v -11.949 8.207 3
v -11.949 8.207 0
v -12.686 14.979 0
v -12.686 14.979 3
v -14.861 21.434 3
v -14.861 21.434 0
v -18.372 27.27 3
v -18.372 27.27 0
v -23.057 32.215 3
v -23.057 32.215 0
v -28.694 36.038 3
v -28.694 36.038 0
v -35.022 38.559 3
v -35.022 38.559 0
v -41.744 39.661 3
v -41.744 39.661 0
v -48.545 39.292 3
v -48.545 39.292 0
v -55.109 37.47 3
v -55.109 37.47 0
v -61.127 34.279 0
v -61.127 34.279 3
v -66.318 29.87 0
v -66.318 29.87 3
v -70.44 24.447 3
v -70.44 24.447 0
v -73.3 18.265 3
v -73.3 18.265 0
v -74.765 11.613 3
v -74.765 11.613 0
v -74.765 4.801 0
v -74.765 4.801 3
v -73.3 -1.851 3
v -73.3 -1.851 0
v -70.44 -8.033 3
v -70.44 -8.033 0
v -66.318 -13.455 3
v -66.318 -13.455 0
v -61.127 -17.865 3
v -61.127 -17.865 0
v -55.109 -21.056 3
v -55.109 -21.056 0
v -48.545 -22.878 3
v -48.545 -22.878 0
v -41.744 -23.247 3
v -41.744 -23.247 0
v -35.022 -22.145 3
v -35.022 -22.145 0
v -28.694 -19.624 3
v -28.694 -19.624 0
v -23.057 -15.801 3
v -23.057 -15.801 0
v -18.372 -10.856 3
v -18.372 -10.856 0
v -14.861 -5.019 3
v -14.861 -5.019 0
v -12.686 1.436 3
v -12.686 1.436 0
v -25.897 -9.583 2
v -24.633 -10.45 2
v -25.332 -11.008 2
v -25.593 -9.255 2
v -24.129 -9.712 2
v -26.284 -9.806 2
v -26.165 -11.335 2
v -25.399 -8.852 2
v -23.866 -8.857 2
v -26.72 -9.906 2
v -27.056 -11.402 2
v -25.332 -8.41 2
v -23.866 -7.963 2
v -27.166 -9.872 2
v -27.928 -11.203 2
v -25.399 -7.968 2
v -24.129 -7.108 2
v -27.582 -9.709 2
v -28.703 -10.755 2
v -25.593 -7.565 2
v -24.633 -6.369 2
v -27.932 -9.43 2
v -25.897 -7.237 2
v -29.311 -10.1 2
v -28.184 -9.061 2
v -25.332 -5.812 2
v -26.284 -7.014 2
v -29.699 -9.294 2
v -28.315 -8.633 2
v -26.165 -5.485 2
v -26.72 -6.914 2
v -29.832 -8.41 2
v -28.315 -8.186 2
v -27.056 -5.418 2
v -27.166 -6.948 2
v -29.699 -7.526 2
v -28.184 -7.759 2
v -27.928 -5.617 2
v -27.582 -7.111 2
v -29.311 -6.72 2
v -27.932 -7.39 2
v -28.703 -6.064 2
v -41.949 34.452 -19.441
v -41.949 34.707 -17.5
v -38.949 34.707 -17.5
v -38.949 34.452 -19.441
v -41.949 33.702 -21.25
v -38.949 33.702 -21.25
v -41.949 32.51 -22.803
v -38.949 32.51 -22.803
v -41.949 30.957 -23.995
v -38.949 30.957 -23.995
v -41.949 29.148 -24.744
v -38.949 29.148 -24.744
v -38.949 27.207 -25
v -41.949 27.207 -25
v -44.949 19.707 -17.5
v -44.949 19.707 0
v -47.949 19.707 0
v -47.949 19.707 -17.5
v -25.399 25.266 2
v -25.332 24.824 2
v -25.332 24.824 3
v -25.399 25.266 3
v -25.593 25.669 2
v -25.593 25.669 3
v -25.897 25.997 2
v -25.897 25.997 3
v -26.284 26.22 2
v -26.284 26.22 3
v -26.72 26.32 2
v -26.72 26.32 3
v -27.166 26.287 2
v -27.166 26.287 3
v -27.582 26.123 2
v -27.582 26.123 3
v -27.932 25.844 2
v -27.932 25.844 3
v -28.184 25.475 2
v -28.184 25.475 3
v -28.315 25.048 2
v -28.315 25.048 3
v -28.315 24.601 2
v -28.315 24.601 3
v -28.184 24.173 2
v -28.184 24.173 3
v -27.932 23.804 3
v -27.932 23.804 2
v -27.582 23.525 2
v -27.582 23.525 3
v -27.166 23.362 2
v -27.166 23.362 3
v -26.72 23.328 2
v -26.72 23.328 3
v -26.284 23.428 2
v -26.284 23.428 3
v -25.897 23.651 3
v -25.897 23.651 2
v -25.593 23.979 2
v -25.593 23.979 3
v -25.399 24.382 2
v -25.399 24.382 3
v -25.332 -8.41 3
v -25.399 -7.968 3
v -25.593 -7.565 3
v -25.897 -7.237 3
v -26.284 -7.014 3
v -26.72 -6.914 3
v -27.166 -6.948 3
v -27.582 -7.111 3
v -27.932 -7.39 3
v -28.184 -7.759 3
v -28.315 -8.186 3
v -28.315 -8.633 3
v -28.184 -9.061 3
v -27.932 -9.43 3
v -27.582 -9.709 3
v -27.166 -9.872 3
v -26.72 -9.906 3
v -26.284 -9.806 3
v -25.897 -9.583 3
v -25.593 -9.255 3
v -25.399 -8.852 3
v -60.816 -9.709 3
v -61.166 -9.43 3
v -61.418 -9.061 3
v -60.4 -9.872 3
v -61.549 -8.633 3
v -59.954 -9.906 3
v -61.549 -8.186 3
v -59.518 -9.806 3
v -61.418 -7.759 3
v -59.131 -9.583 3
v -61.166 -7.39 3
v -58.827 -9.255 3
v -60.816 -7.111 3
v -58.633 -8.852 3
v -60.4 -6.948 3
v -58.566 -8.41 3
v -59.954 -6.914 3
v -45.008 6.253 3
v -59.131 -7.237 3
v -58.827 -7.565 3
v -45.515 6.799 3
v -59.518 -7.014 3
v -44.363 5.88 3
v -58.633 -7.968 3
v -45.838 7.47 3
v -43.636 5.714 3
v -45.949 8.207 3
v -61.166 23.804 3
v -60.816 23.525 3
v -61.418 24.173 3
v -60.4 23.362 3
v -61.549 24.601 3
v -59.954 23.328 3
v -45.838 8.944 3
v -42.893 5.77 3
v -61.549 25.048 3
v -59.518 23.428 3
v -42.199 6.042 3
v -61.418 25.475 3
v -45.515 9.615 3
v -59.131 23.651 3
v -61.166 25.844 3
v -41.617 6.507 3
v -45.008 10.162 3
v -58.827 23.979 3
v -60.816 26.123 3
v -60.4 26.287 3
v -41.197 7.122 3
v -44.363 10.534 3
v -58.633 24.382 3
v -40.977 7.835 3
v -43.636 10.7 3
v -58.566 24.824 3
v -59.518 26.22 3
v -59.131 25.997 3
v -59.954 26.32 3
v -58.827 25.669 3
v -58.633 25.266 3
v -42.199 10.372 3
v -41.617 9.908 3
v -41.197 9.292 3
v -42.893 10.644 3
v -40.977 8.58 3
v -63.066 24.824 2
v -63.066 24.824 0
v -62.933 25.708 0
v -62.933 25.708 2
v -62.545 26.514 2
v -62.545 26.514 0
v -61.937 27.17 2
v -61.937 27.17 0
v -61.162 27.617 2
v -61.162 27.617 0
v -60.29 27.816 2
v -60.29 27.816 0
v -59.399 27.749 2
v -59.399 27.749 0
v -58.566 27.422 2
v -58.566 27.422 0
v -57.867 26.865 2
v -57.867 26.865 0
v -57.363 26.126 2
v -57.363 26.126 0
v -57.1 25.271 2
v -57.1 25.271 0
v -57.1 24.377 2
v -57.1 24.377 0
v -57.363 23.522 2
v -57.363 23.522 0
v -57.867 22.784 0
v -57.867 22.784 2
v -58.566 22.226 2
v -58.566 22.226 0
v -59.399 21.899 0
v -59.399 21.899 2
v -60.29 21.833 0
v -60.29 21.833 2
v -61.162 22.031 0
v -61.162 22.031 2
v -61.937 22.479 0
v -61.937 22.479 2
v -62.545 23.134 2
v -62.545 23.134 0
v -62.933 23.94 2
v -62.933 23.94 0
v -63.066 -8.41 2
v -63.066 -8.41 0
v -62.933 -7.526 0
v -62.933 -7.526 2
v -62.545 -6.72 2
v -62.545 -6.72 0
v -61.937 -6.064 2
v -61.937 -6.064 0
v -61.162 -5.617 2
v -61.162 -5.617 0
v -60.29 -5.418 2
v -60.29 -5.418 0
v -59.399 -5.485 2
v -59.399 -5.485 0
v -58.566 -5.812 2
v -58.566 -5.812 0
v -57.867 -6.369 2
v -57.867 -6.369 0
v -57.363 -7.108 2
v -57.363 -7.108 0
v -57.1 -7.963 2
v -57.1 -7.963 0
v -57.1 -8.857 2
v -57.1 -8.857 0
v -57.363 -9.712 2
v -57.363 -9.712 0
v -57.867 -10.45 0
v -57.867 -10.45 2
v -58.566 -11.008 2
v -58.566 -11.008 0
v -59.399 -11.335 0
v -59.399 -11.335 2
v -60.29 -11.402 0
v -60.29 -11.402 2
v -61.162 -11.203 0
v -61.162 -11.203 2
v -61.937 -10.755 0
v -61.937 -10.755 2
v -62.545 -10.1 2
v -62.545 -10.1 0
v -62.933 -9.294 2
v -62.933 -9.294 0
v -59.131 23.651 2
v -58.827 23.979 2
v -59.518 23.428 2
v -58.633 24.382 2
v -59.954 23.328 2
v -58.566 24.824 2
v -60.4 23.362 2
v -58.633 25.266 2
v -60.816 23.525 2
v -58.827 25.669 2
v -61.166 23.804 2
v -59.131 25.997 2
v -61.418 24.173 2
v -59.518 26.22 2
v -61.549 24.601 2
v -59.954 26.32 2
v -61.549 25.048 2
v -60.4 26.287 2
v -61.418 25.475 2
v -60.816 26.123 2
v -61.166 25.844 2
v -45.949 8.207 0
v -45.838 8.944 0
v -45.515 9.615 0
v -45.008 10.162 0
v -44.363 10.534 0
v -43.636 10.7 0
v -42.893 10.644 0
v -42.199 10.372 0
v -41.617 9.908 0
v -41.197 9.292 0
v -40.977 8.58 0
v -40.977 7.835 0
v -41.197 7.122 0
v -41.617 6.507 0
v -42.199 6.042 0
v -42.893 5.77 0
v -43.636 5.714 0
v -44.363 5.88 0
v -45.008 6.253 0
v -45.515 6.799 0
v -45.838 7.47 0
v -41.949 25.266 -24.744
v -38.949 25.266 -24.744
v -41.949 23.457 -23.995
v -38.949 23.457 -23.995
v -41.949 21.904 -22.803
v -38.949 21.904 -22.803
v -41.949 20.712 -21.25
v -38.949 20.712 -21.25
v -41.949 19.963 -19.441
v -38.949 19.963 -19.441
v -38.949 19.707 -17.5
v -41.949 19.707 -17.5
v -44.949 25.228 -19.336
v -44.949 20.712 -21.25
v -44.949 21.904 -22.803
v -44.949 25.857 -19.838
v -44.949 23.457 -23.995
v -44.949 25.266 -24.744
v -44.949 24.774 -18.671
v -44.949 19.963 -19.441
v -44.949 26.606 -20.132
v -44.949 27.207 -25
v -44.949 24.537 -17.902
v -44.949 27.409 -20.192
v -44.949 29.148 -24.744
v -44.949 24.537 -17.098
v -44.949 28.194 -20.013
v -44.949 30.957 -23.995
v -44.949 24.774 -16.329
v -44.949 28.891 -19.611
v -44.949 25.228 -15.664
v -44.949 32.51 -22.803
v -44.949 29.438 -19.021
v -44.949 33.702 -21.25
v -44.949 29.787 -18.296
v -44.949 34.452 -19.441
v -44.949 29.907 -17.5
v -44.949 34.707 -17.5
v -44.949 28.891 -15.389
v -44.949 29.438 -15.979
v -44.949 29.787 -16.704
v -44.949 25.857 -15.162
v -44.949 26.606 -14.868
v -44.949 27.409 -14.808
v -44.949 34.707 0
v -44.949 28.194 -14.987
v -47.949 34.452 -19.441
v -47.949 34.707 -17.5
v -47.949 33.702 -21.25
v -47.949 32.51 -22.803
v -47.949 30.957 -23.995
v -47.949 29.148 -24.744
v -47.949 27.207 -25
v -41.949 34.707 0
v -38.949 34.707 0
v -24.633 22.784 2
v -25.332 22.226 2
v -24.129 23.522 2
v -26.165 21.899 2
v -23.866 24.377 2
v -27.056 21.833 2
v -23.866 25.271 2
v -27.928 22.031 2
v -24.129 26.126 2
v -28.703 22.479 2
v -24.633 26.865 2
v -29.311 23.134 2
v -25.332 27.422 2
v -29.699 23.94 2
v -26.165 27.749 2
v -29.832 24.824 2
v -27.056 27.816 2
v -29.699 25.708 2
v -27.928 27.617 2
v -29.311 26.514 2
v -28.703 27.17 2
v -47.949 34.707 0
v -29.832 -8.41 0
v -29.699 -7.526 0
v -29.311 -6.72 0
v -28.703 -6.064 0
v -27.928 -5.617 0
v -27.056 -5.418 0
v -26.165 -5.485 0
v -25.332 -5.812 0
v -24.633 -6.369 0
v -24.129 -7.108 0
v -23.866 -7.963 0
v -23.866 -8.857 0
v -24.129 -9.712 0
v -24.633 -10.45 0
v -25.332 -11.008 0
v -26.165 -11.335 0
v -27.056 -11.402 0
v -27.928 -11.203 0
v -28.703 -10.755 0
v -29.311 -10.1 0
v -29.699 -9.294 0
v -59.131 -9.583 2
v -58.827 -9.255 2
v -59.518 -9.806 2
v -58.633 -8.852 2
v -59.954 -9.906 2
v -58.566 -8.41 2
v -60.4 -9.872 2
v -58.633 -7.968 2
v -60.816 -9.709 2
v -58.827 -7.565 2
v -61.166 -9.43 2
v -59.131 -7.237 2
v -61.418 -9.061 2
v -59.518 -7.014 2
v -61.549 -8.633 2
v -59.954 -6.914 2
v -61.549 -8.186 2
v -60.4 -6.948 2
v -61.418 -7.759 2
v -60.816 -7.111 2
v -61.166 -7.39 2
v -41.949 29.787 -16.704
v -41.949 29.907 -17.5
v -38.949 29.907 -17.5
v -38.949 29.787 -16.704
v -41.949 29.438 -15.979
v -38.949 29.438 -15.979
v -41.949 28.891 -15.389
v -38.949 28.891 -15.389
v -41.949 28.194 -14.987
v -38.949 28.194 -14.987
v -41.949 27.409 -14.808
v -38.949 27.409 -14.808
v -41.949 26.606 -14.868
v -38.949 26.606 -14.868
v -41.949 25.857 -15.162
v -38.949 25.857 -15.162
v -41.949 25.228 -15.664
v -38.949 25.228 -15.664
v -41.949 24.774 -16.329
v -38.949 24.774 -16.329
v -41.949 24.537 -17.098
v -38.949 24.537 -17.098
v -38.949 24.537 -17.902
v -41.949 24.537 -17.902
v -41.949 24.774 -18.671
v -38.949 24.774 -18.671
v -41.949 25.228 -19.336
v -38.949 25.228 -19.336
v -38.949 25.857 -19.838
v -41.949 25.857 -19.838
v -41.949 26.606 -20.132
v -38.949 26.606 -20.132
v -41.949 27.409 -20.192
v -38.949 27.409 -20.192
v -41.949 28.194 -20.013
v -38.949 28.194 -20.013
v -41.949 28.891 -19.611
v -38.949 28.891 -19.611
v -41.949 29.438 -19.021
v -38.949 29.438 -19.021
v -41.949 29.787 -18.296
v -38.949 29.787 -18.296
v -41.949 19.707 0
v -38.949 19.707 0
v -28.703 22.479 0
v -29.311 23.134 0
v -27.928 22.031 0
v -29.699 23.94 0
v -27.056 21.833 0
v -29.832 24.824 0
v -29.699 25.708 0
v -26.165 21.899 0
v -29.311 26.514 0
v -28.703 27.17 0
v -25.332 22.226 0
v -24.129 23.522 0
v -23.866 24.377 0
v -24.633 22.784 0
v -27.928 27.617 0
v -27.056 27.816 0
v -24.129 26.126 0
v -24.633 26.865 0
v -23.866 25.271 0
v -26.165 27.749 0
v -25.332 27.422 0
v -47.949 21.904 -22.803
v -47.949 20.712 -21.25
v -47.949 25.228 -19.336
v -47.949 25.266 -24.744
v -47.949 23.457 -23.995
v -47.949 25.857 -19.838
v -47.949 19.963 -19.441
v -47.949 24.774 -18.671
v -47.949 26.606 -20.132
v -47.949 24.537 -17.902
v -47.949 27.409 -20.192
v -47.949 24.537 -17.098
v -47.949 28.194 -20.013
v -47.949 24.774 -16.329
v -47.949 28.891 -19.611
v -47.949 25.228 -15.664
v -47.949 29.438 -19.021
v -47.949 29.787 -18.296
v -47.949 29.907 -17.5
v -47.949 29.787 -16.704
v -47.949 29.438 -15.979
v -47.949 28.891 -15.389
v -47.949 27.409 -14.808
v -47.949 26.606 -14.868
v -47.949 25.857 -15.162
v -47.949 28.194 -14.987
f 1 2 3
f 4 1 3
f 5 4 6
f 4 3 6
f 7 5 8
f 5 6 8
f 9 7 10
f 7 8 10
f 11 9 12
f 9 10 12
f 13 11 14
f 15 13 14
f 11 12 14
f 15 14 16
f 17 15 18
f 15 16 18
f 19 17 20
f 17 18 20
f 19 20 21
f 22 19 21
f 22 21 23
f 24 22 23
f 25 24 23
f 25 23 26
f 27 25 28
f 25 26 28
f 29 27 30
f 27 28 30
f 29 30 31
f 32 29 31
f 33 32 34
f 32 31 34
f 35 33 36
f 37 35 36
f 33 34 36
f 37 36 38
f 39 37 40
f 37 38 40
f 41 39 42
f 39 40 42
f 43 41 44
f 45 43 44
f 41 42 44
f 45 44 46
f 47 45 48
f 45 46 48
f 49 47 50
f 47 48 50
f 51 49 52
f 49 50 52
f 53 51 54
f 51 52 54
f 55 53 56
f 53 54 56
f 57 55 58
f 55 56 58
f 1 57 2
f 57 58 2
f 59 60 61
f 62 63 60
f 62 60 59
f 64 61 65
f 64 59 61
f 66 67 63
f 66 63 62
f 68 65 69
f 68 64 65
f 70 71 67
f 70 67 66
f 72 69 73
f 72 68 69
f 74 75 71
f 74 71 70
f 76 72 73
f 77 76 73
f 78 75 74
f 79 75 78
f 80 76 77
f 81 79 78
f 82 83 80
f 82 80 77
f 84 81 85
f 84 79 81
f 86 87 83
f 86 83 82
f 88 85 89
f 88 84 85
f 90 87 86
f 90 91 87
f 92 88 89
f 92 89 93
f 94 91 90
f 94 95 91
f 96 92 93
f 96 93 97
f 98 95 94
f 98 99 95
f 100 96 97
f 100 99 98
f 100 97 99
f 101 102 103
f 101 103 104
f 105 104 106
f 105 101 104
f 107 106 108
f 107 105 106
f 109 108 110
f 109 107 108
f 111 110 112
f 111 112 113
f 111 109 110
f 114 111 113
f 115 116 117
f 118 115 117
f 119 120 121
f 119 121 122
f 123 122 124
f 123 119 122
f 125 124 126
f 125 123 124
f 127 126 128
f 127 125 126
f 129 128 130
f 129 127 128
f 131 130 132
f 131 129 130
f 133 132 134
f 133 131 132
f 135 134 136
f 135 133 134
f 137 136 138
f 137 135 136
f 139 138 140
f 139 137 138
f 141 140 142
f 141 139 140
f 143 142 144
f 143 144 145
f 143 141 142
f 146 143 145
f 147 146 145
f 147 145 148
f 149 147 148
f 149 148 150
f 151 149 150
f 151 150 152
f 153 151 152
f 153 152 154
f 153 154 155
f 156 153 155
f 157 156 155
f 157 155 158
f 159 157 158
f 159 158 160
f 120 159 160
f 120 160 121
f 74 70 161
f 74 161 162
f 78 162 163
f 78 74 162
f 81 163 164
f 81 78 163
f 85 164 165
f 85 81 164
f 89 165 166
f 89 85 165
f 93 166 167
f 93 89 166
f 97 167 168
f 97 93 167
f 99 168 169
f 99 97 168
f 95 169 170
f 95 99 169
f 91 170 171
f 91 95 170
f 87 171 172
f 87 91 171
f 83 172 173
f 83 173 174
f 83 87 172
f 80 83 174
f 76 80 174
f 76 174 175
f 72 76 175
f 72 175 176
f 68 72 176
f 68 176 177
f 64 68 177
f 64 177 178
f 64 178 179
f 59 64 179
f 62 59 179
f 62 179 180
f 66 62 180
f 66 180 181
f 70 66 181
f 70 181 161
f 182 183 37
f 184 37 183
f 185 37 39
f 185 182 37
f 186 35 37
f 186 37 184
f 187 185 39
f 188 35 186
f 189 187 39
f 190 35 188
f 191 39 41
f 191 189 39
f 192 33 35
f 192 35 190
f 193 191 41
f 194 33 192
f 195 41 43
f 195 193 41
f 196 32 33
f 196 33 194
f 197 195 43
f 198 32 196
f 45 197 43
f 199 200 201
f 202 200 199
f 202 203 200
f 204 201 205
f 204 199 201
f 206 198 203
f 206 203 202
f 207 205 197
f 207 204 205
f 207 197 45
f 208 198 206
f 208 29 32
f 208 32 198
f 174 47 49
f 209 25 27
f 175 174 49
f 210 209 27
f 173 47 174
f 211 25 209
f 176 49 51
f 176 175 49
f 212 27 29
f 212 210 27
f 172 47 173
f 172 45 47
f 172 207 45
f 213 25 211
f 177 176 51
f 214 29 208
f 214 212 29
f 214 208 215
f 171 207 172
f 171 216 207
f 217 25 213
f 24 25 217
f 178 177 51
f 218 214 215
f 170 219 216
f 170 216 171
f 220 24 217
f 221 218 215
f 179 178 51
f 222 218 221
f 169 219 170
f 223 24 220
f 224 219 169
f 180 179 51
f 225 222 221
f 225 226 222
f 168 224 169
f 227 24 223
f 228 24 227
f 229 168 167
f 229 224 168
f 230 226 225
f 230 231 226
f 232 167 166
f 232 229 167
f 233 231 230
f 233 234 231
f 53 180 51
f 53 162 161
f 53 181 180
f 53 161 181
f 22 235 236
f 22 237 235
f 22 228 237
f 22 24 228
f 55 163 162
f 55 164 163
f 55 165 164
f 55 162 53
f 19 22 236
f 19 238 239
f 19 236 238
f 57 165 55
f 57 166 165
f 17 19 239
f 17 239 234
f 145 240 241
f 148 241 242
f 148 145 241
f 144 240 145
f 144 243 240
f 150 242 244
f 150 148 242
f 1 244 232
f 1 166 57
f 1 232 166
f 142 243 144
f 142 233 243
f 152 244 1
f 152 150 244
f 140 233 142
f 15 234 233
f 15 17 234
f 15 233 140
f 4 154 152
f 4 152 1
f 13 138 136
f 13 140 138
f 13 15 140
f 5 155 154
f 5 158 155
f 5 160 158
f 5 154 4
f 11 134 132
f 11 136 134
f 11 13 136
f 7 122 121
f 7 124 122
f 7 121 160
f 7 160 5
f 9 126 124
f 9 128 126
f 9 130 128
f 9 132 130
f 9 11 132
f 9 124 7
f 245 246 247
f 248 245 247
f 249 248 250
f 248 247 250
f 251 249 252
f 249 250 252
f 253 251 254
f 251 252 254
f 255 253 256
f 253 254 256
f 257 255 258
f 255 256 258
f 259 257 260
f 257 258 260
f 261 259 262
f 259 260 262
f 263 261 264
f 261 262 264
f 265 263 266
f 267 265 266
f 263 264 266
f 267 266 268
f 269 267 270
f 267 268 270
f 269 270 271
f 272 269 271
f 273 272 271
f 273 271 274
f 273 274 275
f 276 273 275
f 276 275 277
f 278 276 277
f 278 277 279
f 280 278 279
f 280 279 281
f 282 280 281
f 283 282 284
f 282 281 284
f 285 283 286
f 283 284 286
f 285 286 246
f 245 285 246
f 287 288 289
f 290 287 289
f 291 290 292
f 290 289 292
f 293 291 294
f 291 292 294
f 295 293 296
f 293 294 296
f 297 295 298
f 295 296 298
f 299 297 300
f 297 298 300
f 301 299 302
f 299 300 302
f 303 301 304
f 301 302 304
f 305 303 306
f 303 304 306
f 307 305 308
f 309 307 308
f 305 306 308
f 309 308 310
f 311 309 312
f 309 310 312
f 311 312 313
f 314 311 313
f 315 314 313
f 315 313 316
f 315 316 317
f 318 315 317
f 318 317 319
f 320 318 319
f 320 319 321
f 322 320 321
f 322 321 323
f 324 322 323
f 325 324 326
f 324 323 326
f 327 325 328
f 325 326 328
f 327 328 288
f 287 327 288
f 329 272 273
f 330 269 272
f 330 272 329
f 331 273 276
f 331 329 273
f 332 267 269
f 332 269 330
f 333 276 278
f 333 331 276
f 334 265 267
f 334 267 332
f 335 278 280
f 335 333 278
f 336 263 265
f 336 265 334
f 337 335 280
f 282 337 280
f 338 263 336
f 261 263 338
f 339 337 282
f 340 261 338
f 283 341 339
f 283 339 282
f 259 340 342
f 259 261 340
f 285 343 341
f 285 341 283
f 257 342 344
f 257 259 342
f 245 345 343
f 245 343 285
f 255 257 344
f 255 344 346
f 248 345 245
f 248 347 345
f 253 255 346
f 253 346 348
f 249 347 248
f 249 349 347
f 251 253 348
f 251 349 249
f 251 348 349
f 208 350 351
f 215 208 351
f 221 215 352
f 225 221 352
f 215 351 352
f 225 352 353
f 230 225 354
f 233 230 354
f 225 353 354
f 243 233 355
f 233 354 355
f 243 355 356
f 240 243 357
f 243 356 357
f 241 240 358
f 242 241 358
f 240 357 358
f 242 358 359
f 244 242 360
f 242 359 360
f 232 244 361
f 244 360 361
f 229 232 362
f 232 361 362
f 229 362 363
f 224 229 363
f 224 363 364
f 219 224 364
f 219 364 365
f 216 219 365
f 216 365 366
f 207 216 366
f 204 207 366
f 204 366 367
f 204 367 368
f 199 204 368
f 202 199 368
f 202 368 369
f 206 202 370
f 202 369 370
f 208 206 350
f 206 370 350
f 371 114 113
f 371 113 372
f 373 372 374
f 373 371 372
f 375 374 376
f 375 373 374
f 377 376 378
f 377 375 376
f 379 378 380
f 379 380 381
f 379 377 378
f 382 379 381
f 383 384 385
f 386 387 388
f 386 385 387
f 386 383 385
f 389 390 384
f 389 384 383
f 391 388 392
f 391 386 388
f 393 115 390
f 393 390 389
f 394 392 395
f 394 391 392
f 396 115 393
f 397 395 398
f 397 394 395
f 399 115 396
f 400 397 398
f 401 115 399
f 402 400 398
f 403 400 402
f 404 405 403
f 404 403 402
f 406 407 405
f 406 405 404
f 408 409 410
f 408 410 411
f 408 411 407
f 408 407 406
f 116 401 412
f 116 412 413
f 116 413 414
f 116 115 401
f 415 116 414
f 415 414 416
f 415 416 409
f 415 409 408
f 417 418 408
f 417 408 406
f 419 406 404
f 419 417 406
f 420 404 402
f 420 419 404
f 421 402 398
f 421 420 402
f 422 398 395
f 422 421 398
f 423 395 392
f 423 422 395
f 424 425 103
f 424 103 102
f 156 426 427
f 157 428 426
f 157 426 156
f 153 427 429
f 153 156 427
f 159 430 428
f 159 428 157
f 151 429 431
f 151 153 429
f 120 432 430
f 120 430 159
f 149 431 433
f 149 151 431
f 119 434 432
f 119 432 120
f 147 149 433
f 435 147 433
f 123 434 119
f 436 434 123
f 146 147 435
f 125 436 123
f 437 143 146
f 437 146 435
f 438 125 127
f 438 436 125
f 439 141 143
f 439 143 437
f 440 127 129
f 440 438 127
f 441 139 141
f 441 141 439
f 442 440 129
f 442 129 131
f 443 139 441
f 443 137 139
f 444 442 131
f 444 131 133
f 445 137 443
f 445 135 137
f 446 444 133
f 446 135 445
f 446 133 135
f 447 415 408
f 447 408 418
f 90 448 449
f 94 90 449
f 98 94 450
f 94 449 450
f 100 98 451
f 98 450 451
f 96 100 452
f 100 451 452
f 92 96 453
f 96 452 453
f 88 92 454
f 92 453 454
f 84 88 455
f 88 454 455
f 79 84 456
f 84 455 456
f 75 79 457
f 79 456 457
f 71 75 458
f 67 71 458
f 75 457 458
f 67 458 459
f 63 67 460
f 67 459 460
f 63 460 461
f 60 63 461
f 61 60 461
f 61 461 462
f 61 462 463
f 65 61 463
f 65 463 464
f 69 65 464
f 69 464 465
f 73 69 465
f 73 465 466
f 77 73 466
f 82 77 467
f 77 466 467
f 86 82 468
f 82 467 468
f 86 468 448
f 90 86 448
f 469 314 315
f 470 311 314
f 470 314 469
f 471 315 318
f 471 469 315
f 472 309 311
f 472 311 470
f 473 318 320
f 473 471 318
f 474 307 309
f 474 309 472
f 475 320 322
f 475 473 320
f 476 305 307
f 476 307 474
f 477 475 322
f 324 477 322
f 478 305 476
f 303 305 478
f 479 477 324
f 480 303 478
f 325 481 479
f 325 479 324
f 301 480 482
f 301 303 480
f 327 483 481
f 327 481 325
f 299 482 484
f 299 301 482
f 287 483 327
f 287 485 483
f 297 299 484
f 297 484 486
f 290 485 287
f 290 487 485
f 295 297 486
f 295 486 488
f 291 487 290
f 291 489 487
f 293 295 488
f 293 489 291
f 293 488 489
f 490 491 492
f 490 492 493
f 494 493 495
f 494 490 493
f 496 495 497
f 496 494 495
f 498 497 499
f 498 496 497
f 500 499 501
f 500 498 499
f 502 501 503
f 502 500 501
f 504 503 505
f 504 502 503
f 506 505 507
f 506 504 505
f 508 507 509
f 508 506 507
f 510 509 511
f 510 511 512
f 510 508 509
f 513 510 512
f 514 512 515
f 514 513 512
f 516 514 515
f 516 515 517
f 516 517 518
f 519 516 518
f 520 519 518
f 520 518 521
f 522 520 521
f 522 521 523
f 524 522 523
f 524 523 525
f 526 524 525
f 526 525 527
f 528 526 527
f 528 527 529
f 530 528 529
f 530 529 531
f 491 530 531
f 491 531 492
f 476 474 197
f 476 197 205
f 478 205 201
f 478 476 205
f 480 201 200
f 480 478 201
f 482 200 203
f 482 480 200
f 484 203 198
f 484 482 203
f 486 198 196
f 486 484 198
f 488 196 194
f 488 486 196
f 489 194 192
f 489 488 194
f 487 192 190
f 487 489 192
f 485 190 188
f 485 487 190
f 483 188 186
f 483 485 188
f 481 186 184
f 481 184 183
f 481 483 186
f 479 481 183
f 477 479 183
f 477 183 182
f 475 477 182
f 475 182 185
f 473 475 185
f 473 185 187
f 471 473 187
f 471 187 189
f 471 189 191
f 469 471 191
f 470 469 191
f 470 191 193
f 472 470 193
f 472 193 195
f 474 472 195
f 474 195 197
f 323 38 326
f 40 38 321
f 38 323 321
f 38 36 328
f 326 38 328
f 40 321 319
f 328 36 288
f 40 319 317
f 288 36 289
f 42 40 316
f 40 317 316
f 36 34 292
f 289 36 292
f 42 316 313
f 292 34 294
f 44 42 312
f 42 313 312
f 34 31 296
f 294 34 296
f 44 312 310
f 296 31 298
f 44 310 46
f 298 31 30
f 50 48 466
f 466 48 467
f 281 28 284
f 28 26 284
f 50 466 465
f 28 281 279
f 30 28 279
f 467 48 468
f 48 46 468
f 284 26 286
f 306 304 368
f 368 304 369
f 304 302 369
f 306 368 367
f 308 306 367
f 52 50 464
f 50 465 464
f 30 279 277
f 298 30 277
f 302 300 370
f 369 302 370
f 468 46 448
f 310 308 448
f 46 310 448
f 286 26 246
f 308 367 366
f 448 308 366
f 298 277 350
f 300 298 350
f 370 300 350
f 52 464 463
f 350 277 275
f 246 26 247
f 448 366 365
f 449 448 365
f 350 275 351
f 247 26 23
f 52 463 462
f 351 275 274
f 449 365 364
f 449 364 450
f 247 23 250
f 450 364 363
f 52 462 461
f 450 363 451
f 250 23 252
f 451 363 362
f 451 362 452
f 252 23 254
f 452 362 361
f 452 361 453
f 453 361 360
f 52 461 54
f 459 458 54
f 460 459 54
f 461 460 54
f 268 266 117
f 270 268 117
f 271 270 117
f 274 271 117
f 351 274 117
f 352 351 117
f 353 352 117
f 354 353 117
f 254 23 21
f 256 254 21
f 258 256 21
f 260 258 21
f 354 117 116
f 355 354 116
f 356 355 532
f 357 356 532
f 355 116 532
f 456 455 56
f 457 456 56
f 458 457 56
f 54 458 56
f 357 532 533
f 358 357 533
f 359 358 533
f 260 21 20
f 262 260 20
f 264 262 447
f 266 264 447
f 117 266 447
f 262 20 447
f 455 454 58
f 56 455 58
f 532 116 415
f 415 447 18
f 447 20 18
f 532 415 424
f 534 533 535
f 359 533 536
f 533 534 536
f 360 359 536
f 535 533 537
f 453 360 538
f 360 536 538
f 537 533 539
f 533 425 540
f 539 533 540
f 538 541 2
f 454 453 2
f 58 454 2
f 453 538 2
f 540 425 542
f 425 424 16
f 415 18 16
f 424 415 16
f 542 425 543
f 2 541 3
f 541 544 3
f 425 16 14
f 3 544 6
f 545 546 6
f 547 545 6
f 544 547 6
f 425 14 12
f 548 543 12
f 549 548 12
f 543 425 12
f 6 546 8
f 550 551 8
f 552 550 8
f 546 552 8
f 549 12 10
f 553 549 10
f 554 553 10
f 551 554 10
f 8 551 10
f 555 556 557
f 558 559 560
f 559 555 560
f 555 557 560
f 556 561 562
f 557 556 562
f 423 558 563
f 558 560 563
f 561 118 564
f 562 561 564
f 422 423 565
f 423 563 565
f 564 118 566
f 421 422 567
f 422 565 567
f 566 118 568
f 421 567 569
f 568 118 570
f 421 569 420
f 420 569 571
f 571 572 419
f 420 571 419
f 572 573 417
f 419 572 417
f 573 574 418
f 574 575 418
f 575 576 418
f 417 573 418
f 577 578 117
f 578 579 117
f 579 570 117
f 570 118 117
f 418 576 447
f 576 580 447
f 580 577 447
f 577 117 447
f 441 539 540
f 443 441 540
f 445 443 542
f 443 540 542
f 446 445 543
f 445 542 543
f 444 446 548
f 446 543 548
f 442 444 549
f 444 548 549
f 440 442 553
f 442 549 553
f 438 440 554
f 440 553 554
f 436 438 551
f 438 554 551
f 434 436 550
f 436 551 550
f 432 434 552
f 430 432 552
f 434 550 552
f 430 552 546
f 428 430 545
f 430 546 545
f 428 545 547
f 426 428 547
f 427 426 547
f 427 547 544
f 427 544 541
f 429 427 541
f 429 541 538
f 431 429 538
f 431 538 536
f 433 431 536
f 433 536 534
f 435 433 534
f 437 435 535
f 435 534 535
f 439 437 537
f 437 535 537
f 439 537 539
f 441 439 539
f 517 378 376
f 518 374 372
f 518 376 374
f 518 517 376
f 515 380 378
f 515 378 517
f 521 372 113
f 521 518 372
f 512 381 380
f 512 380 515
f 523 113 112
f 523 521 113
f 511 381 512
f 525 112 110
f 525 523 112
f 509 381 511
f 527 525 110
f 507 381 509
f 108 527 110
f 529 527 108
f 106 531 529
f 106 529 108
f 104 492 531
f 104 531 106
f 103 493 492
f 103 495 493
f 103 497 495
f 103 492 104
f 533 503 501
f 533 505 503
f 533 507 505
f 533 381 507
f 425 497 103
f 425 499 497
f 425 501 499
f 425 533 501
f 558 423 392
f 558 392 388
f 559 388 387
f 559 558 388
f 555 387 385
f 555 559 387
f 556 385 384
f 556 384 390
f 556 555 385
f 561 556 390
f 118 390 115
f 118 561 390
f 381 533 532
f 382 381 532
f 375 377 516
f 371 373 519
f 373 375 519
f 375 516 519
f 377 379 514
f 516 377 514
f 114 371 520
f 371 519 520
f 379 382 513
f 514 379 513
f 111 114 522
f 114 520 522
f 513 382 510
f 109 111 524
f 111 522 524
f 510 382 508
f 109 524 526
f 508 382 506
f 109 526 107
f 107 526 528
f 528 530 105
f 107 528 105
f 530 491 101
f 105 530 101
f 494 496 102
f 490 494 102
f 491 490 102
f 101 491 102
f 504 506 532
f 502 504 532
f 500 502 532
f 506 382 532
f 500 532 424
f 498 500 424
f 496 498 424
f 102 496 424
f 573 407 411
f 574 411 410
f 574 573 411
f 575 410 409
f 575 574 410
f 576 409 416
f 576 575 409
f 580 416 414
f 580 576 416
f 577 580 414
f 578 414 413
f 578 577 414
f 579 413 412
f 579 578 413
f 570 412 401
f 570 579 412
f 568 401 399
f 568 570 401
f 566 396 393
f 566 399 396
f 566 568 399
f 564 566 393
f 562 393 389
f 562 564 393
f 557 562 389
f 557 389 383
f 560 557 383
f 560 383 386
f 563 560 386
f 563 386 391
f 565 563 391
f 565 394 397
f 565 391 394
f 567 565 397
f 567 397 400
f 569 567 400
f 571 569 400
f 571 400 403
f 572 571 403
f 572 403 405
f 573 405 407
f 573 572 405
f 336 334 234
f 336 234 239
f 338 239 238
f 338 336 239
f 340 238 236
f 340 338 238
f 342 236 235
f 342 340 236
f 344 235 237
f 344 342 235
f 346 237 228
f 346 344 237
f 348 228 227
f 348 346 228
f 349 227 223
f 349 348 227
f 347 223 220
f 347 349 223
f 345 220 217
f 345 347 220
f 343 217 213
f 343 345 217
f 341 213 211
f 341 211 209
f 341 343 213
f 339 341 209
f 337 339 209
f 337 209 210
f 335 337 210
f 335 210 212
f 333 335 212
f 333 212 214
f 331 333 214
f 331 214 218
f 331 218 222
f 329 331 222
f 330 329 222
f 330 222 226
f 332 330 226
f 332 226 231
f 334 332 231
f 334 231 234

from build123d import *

# Parameters (mm, degrees)
CROQUIS1_R              = 31.5
CROQUIS1_R_2            = 1.5
SALIENTE_EXTRUIR1_DEPTH = 3
CROQUIS4_R              = 2.5
CORTAR_EXTRUIR3_DEPTH   = 3
CROQUIS5_W              = 3
CROQUIS5_H              = 15
SALIENTE_EXTRUIR2_DEPTH = 25
CORTAR_EXTRUIR4_START   = -9
CROQUIS6_R              = 2.7
CORTAR_EXTRUIR4_DEPTH   = 9
CROQUIS7_R              = 3
CORTAR_EXTRUIR5_DEPTH   = 2


with BuildPart() as part:
    # Croquis1 → Saliente-Extruir1 (new body)
    with BuildSketch(Plane.XY):
        with Locations((-43.449193048, 8.207110309)):
            Circle(CROQUIS1_R)
        with Locations((-60.066202406, 24.824119667)):
            Circle(CROQUIS1_R_2, mode=Mode.SUBTRACT)
        with Locations((-26.83218369, 24.824119667)):
            Circle(CROQUIS1_R_2, mode=Mode.SUBTRACT)
        with Locations((-26.83218369, -8.409899049)):
            Circle(CROQUIS1_R_2, mode=Mode.SUBTRACT)
        with Locations((-60.066202406, -8.409899049)):
            Circle(CROQUIS1_R_2, mode=Mode.SUBTRACT)
    extrude(amount=SALIENTE_EXTRUIR1_DEPTH)

    # Croquis4 → Cortar-Extruir3 (cut)
    with BuildSketch(Plane(origin=(0, 0, 0), x_dir=(-1, 0, 0), z_dir=(0, 0, -1))):
        with Locations((43.449193048, 8.207110309)):
            Circle(CROQUIS4_R)
    extrude(amount=-CORTAR_EXTRUIR3_DEPTH, mode=Mode.SUBTRACT)

    # Croquis5 → Saliente-Extruir2 (add)
    with BuildSketch(Plane(origin=(0, 0, 0), x_dir=(-1, 0, 0), z_dir=(0, 0, -1))):
        with Locations((40.449193048, 27.207110309)):
            Rectangle(CROQUIS5_W, CROQUIS5_H)
        with Locations((46.449193048, 27.207110309)):
            Rectangle(CROQUIS5_W, CROQUIS5_H)
    extrude(amount=SALIENTE_EXTRUIR2_DEPTH)

    # Croquis6 → Cortar-Extruir4 (cut)
    with BuildSketch(Plane(origin=(-38.949193048, 0, 0), x_dir=(0, 0, -1), z_dir=(1, 0, 0)).offset(CORTAR_EXTRUIR4_START)):
        with BuildLine():
            Line((25, 34.707110309), (17.5, 34.707110309))
            ThreePointArc((17.5, 34.707110309), (22.803300859, 32.510411168), (25, 27.207110309))
            Line((25, 27.207110309), (25, 34.707110309))
        make_face()
        with BuildLine():
            Line((25, 19.707110309), (25, 27.207110309))
            ThreePointArc((25, 27.207110309), (22.803300859, 21.90380945), (17.5, 19.707110309))
            Line((17.5, 19.707110309), (25, 19.707110309))
        make_face()
        with Locations(Location((17.5, 27.207110309, 0), (0, 0, 90))):
            Circle(CROQUIS6_R)
    extrude(amount=CORTAR_EXTRUIR4_DEPTH, mode=Mode.SUBTRACT)

    # Croquis7 → Cortar-Extruir5 (cut)
    with BuildSketch(Plane(origin=(0, 0, 0), x_dir=(-1, 0, 0), z_dir=(0, 0, -1))):
        with Locations((26.83218369, 24.824119667)):
            Circle(CROQUIS7_R)
        with Locations((60.066202406, 24.824119667)):
            Circle(CROQUIS7_R)
        with Locations((60.066202406, -8.409899049)):
            Circle(CROQUIS7_R)
        with Locations((26.83218369, -8.409899049)):
            Circle(CROQUIS7_R)
    extrude(amount=-CORTAR_EXTRUIR5_DEPTH, mode=Mode.SUBTRACT)


solid = part.part
